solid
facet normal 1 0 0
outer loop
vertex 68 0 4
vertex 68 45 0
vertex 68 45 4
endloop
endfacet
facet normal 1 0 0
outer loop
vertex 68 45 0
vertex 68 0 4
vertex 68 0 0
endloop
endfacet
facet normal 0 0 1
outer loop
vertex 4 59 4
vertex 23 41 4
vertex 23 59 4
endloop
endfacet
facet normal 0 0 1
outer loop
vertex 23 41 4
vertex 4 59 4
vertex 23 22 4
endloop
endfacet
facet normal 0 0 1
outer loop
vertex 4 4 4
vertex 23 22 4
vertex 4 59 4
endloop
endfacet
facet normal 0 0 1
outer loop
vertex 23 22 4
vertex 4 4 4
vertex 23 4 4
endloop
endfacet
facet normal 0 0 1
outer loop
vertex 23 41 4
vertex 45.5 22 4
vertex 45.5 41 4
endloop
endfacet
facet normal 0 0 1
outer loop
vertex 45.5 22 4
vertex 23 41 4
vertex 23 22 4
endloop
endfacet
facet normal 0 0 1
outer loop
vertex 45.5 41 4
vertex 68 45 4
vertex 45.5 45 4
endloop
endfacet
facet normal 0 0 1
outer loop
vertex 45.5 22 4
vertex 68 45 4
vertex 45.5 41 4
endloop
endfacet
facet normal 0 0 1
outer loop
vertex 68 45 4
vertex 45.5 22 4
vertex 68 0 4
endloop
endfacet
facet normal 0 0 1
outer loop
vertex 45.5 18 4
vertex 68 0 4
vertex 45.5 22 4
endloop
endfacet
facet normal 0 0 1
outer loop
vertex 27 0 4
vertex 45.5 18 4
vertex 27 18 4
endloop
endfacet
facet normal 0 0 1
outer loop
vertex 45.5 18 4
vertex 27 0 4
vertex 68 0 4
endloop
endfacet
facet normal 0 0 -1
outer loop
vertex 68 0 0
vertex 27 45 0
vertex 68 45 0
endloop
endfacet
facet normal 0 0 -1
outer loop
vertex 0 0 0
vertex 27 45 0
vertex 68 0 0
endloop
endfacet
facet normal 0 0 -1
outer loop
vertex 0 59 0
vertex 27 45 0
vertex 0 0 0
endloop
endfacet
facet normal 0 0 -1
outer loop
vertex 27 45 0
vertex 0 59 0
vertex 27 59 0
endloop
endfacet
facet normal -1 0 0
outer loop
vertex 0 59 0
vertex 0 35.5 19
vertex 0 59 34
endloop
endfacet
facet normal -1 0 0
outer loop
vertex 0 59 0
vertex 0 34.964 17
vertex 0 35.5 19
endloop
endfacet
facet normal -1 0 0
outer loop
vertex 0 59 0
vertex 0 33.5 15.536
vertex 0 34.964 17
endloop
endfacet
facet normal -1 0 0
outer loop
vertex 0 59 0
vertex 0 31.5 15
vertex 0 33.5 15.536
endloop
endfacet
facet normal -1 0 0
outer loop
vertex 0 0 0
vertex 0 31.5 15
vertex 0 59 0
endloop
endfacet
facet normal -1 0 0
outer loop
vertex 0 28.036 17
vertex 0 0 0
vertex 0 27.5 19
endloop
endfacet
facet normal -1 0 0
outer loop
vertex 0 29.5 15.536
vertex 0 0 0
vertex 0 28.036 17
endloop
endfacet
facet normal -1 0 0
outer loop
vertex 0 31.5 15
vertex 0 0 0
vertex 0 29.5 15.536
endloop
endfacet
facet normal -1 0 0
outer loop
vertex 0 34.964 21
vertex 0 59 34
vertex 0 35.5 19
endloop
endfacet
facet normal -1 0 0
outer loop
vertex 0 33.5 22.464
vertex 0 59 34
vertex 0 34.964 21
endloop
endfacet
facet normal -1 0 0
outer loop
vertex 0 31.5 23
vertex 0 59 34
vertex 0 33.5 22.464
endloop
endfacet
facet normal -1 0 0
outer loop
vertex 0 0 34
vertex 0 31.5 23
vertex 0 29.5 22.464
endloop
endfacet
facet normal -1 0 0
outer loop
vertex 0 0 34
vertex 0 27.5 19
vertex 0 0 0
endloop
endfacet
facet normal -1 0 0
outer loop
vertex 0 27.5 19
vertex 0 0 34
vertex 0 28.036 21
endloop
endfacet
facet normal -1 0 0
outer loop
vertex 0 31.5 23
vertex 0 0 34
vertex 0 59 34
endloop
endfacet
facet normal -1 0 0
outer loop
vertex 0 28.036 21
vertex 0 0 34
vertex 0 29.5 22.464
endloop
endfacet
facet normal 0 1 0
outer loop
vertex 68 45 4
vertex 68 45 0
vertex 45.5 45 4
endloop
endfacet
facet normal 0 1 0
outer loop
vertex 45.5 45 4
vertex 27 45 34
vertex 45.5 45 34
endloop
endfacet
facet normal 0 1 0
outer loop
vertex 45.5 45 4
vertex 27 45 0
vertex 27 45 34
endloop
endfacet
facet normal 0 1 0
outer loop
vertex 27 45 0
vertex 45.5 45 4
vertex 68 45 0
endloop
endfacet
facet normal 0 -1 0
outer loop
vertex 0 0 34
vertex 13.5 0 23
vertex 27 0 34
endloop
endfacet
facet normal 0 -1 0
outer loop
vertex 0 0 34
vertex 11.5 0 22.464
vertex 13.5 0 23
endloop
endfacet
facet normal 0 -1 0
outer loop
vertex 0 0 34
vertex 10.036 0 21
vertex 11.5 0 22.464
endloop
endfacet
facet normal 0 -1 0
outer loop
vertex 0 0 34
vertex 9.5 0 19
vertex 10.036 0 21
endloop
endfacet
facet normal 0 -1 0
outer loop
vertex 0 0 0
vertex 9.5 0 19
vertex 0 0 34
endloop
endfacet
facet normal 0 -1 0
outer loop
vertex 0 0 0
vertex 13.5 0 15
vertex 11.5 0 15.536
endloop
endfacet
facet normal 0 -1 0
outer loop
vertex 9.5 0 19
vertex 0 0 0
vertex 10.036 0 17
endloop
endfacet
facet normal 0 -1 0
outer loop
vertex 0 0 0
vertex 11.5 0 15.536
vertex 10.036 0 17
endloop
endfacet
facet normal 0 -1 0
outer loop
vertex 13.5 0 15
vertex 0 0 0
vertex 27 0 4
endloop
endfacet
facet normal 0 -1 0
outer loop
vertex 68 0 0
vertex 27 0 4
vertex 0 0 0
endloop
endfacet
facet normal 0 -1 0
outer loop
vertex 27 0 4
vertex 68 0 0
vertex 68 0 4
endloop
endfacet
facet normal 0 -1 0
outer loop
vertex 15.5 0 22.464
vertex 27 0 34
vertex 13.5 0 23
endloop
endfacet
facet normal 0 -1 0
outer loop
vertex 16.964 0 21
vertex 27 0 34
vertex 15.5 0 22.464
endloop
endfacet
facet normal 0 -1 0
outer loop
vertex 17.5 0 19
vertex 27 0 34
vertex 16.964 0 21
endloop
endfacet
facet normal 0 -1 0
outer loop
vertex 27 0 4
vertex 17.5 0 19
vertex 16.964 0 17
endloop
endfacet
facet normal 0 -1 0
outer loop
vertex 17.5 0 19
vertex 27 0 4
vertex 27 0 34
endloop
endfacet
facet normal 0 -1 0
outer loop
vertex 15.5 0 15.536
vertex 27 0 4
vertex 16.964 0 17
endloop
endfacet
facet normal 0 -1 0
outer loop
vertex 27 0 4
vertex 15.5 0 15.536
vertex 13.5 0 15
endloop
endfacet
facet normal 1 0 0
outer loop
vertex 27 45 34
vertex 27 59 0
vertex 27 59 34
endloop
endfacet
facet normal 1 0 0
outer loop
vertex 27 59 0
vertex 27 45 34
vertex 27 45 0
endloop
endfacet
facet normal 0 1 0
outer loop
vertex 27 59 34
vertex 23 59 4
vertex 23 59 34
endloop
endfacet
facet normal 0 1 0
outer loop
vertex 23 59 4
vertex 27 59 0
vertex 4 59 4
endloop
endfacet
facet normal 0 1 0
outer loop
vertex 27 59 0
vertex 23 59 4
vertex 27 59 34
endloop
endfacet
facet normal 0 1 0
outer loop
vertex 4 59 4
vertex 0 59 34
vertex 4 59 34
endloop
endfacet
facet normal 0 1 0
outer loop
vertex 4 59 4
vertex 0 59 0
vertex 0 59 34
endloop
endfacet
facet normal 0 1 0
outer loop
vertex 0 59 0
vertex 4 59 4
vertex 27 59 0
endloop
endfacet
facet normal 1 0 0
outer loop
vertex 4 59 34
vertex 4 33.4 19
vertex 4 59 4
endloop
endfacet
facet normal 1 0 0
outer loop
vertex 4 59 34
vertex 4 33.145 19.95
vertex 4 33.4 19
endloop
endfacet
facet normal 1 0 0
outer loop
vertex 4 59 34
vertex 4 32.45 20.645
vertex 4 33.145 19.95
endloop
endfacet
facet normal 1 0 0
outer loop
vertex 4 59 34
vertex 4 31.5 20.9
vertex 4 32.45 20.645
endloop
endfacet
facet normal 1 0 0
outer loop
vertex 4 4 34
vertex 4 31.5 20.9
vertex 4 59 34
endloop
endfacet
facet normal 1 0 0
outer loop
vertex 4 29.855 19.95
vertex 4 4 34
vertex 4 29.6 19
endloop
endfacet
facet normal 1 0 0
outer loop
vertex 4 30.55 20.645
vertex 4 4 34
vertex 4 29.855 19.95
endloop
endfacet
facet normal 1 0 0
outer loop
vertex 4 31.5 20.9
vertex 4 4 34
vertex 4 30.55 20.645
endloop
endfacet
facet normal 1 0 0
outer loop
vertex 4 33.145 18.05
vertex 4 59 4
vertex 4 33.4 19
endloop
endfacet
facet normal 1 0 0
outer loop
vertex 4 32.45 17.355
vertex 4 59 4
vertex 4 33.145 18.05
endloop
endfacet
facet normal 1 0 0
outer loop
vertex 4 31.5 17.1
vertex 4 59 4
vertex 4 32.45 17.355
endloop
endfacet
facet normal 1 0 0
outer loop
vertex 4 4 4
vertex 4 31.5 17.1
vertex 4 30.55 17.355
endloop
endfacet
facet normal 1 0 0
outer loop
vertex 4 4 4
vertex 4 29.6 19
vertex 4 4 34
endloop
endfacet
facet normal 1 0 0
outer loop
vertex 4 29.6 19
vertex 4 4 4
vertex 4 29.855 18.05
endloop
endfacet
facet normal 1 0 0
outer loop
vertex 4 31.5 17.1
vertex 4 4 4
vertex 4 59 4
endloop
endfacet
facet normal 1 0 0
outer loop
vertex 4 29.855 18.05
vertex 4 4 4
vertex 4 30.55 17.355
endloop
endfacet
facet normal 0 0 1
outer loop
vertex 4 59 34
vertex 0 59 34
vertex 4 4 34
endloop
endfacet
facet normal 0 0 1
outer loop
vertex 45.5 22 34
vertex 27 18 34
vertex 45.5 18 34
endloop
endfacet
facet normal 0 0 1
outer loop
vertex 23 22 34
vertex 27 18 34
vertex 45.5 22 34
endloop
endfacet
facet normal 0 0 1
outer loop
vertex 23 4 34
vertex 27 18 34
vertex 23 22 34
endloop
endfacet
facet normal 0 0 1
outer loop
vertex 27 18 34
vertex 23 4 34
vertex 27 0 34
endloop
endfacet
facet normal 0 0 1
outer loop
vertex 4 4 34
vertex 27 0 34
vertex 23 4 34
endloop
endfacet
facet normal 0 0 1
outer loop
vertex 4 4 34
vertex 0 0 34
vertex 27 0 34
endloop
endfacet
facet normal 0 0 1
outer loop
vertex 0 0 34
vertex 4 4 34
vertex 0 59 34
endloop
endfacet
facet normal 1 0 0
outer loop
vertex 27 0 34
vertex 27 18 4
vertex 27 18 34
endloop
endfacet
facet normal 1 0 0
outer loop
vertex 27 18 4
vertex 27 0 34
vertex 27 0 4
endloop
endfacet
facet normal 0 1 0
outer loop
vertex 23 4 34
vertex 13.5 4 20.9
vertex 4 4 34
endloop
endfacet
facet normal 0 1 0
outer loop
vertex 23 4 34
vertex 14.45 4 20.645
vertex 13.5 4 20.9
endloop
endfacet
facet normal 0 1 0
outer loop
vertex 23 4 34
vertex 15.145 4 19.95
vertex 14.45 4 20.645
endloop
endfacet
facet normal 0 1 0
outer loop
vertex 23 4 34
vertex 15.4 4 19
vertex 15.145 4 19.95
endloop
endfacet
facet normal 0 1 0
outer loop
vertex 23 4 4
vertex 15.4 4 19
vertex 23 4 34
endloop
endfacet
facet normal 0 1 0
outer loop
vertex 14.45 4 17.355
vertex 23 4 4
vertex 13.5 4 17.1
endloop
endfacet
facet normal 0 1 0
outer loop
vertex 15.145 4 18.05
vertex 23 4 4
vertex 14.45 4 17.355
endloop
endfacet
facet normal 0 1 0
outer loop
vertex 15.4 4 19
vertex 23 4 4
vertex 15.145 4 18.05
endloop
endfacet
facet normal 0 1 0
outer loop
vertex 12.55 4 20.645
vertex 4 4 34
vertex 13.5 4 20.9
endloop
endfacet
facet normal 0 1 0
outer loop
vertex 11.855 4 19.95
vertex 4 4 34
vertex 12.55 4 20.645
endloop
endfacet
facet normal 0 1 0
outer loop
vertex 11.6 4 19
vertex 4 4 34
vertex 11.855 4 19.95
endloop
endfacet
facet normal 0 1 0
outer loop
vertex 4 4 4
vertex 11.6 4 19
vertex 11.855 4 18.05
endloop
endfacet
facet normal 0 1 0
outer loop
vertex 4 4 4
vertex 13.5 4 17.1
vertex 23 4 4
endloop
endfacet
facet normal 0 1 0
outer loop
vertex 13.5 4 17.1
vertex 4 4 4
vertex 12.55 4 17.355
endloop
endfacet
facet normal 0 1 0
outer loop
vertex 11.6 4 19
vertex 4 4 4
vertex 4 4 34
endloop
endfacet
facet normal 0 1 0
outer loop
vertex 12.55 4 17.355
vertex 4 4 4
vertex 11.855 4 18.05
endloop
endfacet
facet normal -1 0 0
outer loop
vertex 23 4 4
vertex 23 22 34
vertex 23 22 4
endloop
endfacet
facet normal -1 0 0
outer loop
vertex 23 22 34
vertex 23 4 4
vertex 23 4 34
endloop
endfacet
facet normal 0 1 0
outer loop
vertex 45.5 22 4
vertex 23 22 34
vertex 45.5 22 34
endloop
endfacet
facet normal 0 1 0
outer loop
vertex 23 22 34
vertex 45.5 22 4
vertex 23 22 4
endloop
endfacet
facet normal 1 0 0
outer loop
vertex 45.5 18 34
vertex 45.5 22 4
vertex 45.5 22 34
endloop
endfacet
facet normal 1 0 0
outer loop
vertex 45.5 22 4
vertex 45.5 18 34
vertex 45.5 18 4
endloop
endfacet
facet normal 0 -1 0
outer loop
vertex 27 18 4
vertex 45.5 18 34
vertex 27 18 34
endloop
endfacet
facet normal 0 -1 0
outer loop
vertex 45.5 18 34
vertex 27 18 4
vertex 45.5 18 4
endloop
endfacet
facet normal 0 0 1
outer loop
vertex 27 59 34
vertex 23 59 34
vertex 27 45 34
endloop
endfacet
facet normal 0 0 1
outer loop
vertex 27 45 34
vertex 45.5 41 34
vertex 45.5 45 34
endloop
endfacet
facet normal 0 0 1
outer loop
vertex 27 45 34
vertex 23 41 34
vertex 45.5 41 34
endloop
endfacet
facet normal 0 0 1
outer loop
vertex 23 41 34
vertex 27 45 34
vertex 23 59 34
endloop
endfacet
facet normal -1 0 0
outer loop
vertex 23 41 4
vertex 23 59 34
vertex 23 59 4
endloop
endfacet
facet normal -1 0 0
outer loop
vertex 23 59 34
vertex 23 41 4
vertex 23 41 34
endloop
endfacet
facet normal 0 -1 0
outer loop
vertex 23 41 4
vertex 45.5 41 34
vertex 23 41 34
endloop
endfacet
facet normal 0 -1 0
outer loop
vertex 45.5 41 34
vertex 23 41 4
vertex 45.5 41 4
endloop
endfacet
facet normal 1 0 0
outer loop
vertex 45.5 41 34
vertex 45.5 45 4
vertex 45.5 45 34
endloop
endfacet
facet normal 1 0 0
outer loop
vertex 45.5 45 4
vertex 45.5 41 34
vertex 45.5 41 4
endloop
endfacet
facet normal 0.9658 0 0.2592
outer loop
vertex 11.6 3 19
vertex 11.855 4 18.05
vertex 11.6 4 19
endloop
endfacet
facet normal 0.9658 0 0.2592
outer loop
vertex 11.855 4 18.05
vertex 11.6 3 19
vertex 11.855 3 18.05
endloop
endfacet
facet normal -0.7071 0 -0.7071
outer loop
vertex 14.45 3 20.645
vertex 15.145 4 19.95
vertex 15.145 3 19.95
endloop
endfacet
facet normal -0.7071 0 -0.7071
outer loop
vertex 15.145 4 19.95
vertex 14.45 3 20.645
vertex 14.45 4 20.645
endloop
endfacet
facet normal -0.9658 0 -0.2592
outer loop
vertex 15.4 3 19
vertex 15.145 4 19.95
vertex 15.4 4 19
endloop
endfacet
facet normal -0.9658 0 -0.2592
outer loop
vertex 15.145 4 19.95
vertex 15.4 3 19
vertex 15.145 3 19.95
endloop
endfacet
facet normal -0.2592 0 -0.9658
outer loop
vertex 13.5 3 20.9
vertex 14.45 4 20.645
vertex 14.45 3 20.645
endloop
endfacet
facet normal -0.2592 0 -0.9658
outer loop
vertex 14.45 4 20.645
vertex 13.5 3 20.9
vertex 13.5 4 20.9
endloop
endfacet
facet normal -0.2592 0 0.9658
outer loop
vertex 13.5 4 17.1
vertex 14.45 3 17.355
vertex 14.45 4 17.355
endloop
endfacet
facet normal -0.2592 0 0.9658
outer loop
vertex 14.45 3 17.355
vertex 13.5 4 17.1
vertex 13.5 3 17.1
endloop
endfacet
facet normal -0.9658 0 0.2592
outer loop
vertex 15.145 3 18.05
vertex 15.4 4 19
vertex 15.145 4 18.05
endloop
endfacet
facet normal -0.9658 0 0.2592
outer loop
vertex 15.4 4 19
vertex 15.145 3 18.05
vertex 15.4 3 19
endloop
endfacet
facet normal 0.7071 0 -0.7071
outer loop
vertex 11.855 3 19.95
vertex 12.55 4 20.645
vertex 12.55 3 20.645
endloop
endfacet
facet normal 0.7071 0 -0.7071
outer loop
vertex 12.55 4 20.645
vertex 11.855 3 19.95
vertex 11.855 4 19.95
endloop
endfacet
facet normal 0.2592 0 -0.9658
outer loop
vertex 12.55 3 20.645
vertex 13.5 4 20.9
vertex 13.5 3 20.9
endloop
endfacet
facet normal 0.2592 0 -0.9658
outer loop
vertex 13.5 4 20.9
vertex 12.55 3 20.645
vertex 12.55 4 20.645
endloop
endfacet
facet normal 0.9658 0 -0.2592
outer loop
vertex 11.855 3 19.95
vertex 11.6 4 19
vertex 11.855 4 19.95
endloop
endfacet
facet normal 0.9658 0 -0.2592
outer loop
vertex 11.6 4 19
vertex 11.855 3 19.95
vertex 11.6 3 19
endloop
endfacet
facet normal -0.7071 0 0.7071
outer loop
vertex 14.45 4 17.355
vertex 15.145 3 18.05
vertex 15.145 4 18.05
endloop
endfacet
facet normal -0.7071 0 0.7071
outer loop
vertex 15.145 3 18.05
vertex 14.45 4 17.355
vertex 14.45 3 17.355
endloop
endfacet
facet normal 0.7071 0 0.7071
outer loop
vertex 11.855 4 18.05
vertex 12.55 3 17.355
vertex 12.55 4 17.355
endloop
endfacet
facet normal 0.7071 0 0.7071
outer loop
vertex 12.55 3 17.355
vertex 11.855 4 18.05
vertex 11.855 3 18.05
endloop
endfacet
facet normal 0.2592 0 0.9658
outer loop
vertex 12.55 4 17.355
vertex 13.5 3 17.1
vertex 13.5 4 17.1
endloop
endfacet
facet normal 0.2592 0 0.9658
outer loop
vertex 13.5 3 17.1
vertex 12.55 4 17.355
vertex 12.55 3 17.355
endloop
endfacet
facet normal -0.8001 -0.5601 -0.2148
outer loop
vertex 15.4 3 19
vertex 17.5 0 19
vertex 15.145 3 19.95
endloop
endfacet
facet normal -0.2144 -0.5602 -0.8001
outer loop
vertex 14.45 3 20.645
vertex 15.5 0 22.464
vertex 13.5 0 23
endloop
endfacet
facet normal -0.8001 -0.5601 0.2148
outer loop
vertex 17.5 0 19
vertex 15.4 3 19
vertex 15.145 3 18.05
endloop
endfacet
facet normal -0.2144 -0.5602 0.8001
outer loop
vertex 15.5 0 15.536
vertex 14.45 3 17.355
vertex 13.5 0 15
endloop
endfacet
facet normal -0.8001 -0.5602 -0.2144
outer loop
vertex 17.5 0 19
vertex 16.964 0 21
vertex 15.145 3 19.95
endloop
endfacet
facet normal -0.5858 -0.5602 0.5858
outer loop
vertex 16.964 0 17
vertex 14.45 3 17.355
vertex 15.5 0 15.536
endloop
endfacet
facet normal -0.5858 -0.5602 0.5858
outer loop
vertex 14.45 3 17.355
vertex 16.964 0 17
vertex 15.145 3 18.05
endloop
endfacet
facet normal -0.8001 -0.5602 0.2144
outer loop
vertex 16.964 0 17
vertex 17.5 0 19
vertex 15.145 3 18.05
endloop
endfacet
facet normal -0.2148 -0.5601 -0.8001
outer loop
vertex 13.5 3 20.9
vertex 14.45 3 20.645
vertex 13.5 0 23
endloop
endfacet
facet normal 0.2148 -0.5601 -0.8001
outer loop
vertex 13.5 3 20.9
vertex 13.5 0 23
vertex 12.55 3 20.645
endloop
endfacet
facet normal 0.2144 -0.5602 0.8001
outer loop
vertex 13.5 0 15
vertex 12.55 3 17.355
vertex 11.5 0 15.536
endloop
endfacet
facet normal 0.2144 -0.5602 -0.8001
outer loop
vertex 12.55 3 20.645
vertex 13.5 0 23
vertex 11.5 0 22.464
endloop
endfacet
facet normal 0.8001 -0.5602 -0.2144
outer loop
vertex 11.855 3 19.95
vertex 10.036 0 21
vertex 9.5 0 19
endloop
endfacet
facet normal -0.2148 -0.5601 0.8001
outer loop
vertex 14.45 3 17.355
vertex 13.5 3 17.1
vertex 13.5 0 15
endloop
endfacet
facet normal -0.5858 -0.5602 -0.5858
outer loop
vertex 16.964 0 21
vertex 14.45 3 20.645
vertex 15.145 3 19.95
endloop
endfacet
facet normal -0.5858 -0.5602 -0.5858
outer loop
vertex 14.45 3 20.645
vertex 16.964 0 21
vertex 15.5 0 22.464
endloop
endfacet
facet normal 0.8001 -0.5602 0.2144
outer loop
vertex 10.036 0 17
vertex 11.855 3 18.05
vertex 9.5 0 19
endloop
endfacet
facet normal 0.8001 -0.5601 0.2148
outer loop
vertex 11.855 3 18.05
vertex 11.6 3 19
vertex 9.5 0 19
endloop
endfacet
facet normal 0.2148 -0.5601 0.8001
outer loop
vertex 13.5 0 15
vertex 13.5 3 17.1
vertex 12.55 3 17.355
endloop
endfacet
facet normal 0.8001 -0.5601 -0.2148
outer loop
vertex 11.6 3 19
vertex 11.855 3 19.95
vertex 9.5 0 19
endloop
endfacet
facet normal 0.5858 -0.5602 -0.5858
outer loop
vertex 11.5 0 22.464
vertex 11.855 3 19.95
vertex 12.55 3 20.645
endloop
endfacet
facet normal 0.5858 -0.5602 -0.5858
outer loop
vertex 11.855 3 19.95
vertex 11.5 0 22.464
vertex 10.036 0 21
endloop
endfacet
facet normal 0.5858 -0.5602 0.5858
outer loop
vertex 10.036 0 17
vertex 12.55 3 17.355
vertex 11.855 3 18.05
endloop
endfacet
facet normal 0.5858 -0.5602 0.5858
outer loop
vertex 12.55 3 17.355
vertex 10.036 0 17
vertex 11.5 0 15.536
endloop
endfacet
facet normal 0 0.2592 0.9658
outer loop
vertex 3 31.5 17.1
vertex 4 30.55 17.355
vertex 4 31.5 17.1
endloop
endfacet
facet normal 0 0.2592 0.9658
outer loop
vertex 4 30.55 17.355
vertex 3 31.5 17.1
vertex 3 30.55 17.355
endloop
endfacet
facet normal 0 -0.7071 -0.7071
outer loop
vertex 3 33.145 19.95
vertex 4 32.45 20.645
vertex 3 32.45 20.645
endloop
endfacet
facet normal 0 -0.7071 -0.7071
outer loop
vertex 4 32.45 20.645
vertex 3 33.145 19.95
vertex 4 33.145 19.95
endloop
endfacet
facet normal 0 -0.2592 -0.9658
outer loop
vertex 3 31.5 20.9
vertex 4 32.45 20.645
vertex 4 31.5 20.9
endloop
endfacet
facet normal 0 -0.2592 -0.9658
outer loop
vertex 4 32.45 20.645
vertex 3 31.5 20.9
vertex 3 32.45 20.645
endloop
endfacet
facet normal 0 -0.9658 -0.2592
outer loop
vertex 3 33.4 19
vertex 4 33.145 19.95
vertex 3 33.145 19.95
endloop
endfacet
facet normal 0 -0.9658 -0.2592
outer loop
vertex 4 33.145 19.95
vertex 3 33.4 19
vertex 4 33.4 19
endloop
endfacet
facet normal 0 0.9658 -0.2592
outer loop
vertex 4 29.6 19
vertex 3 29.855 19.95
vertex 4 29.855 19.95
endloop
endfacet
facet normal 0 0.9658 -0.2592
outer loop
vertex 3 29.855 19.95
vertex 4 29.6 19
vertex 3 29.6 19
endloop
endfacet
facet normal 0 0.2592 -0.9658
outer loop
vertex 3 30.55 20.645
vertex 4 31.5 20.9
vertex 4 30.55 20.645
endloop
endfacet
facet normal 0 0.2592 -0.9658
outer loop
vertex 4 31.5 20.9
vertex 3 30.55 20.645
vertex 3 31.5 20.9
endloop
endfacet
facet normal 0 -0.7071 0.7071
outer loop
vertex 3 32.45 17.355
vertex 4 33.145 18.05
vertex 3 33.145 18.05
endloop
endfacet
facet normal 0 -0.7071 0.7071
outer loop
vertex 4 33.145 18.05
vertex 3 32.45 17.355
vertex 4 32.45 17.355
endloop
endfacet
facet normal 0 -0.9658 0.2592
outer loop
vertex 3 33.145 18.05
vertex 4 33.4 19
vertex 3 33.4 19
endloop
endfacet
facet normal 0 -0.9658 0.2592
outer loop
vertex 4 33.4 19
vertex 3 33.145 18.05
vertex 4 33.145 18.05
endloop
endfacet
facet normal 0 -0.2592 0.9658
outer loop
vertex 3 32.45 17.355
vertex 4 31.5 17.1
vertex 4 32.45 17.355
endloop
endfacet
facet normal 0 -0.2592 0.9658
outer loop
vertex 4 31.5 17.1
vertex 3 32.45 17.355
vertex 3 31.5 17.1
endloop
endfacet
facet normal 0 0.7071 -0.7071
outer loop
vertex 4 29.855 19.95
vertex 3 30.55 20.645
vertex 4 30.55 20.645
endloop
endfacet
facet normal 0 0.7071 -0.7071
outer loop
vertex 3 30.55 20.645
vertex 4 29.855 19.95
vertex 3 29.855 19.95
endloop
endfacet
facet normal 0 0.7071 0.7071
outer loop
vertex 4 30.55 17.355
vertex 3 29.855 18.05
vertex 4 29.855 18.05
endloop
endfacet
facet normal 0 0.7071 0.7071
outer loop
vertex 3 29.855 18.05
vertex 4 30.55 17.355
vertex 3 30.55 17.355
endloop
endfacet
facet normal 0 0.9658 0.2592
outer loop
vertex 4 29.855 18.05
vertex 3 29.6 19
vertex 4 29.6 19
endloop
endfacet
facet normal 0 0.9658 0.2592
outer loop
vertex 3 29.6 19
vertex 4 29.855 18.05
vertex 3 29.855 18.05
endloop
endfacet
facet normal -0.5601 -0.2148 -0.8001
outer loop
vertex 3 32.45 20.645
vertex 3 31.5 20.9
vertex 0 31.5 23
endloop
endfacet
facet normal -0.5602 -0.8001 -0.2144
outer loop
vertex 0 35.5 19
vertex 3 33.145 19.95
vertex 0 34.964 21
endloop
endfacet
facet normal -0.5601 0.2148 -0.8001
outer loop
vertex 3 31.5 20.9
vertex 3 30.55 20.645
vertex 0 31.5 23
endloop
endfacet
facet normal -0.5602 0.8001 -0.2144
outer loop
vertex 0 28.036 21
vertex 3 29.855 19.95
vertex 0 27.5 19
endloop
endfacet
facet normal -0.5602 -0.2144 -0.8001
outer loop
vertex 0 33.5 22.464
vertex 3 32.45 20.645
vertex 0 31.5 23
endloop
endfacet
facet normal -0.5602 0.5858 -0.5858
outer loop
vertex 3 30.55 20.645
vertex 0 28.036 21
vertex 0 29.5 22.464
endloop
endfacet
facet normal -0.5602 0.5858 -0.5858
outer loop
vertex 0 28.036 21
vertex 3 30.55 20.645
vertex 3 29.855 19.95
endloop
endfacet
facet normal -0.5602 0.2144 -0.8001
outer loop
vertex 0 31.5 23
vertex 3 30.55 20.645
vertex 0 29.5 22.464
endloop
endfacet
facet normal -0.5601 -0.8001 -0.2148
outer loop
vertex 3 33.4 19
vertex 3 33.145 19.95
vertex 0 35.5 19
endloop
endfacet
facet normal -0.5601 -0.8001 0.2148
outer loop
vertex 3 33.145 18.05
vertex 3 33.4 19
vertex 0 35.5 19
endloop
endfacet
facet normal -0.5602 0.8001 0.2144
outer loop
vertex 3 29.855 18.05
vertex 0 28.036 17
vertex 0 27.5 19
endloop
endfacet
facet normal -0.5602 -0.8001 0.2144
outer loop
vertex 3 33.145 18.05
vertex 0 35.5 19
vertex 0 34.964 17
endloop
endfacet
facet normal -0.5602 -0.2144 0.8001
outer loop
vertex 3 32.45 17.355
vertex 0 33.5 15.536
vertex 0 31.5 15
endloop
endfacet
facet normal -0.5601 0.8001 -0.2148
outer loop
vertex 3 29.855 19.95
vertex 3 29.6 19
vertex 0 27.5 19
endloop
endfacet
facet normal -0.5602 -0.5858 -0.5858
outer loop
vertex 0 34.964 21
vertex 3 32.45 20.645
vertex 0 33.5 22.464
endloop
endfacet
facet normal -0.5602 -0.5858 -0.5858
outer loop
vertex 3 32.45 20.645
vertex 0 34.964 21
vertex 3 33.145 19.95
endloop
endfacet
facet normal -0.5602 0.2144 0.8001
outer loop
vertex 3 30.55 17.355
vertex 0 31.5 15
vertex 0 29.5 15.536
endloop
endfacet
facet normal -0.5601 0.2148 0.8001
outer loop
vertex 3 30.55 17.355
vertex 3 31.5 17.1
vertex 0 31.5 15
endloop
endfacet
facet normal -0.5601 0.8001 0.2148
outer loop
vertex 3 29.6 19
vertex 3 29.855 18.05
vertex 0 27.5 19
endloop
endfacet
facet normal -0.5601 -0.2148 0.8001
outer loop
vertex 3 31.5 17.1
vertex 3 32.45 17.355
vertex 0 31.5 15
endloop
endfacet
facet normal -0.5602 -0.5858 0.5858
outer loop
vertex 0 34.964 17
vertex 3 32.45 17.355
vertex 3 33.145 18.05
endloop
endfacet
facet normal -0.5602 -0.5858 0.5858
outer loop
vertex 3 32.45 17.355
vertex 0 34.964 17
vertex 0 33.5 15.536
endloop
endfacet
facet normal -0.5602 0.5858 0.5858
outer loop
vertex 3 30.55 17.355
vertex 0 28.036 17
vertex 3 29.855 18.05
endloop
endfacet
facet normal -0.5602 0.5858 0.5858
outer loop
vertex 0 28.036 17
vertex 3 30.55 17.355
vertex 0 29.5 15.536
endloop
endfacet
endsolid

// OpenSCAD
difference(){
	union() {
		union() {
			cube(size = [68, 45, 4]);
			cube(size = [27, 59, 4]);
		}
		translate(v = [0, 0, 4]) {
			cube(size = [4, 59, 30]);
		}
		translate(v = [0, 0, 4]) {
			cube(size = [27, 4, 30]);
		}
		translate(v = [23, 0, 4]) {
			cube(size = [4, 22, 30]);
		}
		translate(v = [23, 18, 4]) {
			cube(size = [22.5000000000, 4, 30]);
		}
		translate(v = [23, 41, 4]) {
			cube(size = [4, 18, 30]);
		}
		translate(v = [23, 41, 4]) {
			cube(size = [22.5000000000, 4, 30]);
		}
	}
	/* Holes Below*/
	union(){
		translate(v = [13.5000000000, 0, 19.0000000000]) {
			rotate(a = 90, v = [1, 0, 0]) {
				union() {
					union() {
						translate(v = [0, 0, -5]) {
							cylinder($fn = 12, h = 5, r = 1.9000000000);
						}
						translate(v = [0, 0, -3]) {
							cylinder($fn = 12, h = 3, r1 = 1.9000000000, r2 = 4);
						}
					}
					cylinder($fn = 12, h = 1, r = 4);
				}
			}
		}
		translate(v = [0, 31.5000000000, 19.0000000000]) {
			rotate(a = -90, v = [0, 1, 0]) {
				union() {
					union() {
						translate(v = [0, 0, -5]) {
							cylinder($fn = 12, h = 5, r = 1.9000000000);
						}
						translate(v = [0, 0, -3]) {
							cylinder($fn = 12, h = 3, r1 = 1.9000000000, r2 = 4);
						}
					}
					cylinder($fn = 12, h = 1, r = 4);
				}
			}
		}
	} /* End Holes */ 
}
